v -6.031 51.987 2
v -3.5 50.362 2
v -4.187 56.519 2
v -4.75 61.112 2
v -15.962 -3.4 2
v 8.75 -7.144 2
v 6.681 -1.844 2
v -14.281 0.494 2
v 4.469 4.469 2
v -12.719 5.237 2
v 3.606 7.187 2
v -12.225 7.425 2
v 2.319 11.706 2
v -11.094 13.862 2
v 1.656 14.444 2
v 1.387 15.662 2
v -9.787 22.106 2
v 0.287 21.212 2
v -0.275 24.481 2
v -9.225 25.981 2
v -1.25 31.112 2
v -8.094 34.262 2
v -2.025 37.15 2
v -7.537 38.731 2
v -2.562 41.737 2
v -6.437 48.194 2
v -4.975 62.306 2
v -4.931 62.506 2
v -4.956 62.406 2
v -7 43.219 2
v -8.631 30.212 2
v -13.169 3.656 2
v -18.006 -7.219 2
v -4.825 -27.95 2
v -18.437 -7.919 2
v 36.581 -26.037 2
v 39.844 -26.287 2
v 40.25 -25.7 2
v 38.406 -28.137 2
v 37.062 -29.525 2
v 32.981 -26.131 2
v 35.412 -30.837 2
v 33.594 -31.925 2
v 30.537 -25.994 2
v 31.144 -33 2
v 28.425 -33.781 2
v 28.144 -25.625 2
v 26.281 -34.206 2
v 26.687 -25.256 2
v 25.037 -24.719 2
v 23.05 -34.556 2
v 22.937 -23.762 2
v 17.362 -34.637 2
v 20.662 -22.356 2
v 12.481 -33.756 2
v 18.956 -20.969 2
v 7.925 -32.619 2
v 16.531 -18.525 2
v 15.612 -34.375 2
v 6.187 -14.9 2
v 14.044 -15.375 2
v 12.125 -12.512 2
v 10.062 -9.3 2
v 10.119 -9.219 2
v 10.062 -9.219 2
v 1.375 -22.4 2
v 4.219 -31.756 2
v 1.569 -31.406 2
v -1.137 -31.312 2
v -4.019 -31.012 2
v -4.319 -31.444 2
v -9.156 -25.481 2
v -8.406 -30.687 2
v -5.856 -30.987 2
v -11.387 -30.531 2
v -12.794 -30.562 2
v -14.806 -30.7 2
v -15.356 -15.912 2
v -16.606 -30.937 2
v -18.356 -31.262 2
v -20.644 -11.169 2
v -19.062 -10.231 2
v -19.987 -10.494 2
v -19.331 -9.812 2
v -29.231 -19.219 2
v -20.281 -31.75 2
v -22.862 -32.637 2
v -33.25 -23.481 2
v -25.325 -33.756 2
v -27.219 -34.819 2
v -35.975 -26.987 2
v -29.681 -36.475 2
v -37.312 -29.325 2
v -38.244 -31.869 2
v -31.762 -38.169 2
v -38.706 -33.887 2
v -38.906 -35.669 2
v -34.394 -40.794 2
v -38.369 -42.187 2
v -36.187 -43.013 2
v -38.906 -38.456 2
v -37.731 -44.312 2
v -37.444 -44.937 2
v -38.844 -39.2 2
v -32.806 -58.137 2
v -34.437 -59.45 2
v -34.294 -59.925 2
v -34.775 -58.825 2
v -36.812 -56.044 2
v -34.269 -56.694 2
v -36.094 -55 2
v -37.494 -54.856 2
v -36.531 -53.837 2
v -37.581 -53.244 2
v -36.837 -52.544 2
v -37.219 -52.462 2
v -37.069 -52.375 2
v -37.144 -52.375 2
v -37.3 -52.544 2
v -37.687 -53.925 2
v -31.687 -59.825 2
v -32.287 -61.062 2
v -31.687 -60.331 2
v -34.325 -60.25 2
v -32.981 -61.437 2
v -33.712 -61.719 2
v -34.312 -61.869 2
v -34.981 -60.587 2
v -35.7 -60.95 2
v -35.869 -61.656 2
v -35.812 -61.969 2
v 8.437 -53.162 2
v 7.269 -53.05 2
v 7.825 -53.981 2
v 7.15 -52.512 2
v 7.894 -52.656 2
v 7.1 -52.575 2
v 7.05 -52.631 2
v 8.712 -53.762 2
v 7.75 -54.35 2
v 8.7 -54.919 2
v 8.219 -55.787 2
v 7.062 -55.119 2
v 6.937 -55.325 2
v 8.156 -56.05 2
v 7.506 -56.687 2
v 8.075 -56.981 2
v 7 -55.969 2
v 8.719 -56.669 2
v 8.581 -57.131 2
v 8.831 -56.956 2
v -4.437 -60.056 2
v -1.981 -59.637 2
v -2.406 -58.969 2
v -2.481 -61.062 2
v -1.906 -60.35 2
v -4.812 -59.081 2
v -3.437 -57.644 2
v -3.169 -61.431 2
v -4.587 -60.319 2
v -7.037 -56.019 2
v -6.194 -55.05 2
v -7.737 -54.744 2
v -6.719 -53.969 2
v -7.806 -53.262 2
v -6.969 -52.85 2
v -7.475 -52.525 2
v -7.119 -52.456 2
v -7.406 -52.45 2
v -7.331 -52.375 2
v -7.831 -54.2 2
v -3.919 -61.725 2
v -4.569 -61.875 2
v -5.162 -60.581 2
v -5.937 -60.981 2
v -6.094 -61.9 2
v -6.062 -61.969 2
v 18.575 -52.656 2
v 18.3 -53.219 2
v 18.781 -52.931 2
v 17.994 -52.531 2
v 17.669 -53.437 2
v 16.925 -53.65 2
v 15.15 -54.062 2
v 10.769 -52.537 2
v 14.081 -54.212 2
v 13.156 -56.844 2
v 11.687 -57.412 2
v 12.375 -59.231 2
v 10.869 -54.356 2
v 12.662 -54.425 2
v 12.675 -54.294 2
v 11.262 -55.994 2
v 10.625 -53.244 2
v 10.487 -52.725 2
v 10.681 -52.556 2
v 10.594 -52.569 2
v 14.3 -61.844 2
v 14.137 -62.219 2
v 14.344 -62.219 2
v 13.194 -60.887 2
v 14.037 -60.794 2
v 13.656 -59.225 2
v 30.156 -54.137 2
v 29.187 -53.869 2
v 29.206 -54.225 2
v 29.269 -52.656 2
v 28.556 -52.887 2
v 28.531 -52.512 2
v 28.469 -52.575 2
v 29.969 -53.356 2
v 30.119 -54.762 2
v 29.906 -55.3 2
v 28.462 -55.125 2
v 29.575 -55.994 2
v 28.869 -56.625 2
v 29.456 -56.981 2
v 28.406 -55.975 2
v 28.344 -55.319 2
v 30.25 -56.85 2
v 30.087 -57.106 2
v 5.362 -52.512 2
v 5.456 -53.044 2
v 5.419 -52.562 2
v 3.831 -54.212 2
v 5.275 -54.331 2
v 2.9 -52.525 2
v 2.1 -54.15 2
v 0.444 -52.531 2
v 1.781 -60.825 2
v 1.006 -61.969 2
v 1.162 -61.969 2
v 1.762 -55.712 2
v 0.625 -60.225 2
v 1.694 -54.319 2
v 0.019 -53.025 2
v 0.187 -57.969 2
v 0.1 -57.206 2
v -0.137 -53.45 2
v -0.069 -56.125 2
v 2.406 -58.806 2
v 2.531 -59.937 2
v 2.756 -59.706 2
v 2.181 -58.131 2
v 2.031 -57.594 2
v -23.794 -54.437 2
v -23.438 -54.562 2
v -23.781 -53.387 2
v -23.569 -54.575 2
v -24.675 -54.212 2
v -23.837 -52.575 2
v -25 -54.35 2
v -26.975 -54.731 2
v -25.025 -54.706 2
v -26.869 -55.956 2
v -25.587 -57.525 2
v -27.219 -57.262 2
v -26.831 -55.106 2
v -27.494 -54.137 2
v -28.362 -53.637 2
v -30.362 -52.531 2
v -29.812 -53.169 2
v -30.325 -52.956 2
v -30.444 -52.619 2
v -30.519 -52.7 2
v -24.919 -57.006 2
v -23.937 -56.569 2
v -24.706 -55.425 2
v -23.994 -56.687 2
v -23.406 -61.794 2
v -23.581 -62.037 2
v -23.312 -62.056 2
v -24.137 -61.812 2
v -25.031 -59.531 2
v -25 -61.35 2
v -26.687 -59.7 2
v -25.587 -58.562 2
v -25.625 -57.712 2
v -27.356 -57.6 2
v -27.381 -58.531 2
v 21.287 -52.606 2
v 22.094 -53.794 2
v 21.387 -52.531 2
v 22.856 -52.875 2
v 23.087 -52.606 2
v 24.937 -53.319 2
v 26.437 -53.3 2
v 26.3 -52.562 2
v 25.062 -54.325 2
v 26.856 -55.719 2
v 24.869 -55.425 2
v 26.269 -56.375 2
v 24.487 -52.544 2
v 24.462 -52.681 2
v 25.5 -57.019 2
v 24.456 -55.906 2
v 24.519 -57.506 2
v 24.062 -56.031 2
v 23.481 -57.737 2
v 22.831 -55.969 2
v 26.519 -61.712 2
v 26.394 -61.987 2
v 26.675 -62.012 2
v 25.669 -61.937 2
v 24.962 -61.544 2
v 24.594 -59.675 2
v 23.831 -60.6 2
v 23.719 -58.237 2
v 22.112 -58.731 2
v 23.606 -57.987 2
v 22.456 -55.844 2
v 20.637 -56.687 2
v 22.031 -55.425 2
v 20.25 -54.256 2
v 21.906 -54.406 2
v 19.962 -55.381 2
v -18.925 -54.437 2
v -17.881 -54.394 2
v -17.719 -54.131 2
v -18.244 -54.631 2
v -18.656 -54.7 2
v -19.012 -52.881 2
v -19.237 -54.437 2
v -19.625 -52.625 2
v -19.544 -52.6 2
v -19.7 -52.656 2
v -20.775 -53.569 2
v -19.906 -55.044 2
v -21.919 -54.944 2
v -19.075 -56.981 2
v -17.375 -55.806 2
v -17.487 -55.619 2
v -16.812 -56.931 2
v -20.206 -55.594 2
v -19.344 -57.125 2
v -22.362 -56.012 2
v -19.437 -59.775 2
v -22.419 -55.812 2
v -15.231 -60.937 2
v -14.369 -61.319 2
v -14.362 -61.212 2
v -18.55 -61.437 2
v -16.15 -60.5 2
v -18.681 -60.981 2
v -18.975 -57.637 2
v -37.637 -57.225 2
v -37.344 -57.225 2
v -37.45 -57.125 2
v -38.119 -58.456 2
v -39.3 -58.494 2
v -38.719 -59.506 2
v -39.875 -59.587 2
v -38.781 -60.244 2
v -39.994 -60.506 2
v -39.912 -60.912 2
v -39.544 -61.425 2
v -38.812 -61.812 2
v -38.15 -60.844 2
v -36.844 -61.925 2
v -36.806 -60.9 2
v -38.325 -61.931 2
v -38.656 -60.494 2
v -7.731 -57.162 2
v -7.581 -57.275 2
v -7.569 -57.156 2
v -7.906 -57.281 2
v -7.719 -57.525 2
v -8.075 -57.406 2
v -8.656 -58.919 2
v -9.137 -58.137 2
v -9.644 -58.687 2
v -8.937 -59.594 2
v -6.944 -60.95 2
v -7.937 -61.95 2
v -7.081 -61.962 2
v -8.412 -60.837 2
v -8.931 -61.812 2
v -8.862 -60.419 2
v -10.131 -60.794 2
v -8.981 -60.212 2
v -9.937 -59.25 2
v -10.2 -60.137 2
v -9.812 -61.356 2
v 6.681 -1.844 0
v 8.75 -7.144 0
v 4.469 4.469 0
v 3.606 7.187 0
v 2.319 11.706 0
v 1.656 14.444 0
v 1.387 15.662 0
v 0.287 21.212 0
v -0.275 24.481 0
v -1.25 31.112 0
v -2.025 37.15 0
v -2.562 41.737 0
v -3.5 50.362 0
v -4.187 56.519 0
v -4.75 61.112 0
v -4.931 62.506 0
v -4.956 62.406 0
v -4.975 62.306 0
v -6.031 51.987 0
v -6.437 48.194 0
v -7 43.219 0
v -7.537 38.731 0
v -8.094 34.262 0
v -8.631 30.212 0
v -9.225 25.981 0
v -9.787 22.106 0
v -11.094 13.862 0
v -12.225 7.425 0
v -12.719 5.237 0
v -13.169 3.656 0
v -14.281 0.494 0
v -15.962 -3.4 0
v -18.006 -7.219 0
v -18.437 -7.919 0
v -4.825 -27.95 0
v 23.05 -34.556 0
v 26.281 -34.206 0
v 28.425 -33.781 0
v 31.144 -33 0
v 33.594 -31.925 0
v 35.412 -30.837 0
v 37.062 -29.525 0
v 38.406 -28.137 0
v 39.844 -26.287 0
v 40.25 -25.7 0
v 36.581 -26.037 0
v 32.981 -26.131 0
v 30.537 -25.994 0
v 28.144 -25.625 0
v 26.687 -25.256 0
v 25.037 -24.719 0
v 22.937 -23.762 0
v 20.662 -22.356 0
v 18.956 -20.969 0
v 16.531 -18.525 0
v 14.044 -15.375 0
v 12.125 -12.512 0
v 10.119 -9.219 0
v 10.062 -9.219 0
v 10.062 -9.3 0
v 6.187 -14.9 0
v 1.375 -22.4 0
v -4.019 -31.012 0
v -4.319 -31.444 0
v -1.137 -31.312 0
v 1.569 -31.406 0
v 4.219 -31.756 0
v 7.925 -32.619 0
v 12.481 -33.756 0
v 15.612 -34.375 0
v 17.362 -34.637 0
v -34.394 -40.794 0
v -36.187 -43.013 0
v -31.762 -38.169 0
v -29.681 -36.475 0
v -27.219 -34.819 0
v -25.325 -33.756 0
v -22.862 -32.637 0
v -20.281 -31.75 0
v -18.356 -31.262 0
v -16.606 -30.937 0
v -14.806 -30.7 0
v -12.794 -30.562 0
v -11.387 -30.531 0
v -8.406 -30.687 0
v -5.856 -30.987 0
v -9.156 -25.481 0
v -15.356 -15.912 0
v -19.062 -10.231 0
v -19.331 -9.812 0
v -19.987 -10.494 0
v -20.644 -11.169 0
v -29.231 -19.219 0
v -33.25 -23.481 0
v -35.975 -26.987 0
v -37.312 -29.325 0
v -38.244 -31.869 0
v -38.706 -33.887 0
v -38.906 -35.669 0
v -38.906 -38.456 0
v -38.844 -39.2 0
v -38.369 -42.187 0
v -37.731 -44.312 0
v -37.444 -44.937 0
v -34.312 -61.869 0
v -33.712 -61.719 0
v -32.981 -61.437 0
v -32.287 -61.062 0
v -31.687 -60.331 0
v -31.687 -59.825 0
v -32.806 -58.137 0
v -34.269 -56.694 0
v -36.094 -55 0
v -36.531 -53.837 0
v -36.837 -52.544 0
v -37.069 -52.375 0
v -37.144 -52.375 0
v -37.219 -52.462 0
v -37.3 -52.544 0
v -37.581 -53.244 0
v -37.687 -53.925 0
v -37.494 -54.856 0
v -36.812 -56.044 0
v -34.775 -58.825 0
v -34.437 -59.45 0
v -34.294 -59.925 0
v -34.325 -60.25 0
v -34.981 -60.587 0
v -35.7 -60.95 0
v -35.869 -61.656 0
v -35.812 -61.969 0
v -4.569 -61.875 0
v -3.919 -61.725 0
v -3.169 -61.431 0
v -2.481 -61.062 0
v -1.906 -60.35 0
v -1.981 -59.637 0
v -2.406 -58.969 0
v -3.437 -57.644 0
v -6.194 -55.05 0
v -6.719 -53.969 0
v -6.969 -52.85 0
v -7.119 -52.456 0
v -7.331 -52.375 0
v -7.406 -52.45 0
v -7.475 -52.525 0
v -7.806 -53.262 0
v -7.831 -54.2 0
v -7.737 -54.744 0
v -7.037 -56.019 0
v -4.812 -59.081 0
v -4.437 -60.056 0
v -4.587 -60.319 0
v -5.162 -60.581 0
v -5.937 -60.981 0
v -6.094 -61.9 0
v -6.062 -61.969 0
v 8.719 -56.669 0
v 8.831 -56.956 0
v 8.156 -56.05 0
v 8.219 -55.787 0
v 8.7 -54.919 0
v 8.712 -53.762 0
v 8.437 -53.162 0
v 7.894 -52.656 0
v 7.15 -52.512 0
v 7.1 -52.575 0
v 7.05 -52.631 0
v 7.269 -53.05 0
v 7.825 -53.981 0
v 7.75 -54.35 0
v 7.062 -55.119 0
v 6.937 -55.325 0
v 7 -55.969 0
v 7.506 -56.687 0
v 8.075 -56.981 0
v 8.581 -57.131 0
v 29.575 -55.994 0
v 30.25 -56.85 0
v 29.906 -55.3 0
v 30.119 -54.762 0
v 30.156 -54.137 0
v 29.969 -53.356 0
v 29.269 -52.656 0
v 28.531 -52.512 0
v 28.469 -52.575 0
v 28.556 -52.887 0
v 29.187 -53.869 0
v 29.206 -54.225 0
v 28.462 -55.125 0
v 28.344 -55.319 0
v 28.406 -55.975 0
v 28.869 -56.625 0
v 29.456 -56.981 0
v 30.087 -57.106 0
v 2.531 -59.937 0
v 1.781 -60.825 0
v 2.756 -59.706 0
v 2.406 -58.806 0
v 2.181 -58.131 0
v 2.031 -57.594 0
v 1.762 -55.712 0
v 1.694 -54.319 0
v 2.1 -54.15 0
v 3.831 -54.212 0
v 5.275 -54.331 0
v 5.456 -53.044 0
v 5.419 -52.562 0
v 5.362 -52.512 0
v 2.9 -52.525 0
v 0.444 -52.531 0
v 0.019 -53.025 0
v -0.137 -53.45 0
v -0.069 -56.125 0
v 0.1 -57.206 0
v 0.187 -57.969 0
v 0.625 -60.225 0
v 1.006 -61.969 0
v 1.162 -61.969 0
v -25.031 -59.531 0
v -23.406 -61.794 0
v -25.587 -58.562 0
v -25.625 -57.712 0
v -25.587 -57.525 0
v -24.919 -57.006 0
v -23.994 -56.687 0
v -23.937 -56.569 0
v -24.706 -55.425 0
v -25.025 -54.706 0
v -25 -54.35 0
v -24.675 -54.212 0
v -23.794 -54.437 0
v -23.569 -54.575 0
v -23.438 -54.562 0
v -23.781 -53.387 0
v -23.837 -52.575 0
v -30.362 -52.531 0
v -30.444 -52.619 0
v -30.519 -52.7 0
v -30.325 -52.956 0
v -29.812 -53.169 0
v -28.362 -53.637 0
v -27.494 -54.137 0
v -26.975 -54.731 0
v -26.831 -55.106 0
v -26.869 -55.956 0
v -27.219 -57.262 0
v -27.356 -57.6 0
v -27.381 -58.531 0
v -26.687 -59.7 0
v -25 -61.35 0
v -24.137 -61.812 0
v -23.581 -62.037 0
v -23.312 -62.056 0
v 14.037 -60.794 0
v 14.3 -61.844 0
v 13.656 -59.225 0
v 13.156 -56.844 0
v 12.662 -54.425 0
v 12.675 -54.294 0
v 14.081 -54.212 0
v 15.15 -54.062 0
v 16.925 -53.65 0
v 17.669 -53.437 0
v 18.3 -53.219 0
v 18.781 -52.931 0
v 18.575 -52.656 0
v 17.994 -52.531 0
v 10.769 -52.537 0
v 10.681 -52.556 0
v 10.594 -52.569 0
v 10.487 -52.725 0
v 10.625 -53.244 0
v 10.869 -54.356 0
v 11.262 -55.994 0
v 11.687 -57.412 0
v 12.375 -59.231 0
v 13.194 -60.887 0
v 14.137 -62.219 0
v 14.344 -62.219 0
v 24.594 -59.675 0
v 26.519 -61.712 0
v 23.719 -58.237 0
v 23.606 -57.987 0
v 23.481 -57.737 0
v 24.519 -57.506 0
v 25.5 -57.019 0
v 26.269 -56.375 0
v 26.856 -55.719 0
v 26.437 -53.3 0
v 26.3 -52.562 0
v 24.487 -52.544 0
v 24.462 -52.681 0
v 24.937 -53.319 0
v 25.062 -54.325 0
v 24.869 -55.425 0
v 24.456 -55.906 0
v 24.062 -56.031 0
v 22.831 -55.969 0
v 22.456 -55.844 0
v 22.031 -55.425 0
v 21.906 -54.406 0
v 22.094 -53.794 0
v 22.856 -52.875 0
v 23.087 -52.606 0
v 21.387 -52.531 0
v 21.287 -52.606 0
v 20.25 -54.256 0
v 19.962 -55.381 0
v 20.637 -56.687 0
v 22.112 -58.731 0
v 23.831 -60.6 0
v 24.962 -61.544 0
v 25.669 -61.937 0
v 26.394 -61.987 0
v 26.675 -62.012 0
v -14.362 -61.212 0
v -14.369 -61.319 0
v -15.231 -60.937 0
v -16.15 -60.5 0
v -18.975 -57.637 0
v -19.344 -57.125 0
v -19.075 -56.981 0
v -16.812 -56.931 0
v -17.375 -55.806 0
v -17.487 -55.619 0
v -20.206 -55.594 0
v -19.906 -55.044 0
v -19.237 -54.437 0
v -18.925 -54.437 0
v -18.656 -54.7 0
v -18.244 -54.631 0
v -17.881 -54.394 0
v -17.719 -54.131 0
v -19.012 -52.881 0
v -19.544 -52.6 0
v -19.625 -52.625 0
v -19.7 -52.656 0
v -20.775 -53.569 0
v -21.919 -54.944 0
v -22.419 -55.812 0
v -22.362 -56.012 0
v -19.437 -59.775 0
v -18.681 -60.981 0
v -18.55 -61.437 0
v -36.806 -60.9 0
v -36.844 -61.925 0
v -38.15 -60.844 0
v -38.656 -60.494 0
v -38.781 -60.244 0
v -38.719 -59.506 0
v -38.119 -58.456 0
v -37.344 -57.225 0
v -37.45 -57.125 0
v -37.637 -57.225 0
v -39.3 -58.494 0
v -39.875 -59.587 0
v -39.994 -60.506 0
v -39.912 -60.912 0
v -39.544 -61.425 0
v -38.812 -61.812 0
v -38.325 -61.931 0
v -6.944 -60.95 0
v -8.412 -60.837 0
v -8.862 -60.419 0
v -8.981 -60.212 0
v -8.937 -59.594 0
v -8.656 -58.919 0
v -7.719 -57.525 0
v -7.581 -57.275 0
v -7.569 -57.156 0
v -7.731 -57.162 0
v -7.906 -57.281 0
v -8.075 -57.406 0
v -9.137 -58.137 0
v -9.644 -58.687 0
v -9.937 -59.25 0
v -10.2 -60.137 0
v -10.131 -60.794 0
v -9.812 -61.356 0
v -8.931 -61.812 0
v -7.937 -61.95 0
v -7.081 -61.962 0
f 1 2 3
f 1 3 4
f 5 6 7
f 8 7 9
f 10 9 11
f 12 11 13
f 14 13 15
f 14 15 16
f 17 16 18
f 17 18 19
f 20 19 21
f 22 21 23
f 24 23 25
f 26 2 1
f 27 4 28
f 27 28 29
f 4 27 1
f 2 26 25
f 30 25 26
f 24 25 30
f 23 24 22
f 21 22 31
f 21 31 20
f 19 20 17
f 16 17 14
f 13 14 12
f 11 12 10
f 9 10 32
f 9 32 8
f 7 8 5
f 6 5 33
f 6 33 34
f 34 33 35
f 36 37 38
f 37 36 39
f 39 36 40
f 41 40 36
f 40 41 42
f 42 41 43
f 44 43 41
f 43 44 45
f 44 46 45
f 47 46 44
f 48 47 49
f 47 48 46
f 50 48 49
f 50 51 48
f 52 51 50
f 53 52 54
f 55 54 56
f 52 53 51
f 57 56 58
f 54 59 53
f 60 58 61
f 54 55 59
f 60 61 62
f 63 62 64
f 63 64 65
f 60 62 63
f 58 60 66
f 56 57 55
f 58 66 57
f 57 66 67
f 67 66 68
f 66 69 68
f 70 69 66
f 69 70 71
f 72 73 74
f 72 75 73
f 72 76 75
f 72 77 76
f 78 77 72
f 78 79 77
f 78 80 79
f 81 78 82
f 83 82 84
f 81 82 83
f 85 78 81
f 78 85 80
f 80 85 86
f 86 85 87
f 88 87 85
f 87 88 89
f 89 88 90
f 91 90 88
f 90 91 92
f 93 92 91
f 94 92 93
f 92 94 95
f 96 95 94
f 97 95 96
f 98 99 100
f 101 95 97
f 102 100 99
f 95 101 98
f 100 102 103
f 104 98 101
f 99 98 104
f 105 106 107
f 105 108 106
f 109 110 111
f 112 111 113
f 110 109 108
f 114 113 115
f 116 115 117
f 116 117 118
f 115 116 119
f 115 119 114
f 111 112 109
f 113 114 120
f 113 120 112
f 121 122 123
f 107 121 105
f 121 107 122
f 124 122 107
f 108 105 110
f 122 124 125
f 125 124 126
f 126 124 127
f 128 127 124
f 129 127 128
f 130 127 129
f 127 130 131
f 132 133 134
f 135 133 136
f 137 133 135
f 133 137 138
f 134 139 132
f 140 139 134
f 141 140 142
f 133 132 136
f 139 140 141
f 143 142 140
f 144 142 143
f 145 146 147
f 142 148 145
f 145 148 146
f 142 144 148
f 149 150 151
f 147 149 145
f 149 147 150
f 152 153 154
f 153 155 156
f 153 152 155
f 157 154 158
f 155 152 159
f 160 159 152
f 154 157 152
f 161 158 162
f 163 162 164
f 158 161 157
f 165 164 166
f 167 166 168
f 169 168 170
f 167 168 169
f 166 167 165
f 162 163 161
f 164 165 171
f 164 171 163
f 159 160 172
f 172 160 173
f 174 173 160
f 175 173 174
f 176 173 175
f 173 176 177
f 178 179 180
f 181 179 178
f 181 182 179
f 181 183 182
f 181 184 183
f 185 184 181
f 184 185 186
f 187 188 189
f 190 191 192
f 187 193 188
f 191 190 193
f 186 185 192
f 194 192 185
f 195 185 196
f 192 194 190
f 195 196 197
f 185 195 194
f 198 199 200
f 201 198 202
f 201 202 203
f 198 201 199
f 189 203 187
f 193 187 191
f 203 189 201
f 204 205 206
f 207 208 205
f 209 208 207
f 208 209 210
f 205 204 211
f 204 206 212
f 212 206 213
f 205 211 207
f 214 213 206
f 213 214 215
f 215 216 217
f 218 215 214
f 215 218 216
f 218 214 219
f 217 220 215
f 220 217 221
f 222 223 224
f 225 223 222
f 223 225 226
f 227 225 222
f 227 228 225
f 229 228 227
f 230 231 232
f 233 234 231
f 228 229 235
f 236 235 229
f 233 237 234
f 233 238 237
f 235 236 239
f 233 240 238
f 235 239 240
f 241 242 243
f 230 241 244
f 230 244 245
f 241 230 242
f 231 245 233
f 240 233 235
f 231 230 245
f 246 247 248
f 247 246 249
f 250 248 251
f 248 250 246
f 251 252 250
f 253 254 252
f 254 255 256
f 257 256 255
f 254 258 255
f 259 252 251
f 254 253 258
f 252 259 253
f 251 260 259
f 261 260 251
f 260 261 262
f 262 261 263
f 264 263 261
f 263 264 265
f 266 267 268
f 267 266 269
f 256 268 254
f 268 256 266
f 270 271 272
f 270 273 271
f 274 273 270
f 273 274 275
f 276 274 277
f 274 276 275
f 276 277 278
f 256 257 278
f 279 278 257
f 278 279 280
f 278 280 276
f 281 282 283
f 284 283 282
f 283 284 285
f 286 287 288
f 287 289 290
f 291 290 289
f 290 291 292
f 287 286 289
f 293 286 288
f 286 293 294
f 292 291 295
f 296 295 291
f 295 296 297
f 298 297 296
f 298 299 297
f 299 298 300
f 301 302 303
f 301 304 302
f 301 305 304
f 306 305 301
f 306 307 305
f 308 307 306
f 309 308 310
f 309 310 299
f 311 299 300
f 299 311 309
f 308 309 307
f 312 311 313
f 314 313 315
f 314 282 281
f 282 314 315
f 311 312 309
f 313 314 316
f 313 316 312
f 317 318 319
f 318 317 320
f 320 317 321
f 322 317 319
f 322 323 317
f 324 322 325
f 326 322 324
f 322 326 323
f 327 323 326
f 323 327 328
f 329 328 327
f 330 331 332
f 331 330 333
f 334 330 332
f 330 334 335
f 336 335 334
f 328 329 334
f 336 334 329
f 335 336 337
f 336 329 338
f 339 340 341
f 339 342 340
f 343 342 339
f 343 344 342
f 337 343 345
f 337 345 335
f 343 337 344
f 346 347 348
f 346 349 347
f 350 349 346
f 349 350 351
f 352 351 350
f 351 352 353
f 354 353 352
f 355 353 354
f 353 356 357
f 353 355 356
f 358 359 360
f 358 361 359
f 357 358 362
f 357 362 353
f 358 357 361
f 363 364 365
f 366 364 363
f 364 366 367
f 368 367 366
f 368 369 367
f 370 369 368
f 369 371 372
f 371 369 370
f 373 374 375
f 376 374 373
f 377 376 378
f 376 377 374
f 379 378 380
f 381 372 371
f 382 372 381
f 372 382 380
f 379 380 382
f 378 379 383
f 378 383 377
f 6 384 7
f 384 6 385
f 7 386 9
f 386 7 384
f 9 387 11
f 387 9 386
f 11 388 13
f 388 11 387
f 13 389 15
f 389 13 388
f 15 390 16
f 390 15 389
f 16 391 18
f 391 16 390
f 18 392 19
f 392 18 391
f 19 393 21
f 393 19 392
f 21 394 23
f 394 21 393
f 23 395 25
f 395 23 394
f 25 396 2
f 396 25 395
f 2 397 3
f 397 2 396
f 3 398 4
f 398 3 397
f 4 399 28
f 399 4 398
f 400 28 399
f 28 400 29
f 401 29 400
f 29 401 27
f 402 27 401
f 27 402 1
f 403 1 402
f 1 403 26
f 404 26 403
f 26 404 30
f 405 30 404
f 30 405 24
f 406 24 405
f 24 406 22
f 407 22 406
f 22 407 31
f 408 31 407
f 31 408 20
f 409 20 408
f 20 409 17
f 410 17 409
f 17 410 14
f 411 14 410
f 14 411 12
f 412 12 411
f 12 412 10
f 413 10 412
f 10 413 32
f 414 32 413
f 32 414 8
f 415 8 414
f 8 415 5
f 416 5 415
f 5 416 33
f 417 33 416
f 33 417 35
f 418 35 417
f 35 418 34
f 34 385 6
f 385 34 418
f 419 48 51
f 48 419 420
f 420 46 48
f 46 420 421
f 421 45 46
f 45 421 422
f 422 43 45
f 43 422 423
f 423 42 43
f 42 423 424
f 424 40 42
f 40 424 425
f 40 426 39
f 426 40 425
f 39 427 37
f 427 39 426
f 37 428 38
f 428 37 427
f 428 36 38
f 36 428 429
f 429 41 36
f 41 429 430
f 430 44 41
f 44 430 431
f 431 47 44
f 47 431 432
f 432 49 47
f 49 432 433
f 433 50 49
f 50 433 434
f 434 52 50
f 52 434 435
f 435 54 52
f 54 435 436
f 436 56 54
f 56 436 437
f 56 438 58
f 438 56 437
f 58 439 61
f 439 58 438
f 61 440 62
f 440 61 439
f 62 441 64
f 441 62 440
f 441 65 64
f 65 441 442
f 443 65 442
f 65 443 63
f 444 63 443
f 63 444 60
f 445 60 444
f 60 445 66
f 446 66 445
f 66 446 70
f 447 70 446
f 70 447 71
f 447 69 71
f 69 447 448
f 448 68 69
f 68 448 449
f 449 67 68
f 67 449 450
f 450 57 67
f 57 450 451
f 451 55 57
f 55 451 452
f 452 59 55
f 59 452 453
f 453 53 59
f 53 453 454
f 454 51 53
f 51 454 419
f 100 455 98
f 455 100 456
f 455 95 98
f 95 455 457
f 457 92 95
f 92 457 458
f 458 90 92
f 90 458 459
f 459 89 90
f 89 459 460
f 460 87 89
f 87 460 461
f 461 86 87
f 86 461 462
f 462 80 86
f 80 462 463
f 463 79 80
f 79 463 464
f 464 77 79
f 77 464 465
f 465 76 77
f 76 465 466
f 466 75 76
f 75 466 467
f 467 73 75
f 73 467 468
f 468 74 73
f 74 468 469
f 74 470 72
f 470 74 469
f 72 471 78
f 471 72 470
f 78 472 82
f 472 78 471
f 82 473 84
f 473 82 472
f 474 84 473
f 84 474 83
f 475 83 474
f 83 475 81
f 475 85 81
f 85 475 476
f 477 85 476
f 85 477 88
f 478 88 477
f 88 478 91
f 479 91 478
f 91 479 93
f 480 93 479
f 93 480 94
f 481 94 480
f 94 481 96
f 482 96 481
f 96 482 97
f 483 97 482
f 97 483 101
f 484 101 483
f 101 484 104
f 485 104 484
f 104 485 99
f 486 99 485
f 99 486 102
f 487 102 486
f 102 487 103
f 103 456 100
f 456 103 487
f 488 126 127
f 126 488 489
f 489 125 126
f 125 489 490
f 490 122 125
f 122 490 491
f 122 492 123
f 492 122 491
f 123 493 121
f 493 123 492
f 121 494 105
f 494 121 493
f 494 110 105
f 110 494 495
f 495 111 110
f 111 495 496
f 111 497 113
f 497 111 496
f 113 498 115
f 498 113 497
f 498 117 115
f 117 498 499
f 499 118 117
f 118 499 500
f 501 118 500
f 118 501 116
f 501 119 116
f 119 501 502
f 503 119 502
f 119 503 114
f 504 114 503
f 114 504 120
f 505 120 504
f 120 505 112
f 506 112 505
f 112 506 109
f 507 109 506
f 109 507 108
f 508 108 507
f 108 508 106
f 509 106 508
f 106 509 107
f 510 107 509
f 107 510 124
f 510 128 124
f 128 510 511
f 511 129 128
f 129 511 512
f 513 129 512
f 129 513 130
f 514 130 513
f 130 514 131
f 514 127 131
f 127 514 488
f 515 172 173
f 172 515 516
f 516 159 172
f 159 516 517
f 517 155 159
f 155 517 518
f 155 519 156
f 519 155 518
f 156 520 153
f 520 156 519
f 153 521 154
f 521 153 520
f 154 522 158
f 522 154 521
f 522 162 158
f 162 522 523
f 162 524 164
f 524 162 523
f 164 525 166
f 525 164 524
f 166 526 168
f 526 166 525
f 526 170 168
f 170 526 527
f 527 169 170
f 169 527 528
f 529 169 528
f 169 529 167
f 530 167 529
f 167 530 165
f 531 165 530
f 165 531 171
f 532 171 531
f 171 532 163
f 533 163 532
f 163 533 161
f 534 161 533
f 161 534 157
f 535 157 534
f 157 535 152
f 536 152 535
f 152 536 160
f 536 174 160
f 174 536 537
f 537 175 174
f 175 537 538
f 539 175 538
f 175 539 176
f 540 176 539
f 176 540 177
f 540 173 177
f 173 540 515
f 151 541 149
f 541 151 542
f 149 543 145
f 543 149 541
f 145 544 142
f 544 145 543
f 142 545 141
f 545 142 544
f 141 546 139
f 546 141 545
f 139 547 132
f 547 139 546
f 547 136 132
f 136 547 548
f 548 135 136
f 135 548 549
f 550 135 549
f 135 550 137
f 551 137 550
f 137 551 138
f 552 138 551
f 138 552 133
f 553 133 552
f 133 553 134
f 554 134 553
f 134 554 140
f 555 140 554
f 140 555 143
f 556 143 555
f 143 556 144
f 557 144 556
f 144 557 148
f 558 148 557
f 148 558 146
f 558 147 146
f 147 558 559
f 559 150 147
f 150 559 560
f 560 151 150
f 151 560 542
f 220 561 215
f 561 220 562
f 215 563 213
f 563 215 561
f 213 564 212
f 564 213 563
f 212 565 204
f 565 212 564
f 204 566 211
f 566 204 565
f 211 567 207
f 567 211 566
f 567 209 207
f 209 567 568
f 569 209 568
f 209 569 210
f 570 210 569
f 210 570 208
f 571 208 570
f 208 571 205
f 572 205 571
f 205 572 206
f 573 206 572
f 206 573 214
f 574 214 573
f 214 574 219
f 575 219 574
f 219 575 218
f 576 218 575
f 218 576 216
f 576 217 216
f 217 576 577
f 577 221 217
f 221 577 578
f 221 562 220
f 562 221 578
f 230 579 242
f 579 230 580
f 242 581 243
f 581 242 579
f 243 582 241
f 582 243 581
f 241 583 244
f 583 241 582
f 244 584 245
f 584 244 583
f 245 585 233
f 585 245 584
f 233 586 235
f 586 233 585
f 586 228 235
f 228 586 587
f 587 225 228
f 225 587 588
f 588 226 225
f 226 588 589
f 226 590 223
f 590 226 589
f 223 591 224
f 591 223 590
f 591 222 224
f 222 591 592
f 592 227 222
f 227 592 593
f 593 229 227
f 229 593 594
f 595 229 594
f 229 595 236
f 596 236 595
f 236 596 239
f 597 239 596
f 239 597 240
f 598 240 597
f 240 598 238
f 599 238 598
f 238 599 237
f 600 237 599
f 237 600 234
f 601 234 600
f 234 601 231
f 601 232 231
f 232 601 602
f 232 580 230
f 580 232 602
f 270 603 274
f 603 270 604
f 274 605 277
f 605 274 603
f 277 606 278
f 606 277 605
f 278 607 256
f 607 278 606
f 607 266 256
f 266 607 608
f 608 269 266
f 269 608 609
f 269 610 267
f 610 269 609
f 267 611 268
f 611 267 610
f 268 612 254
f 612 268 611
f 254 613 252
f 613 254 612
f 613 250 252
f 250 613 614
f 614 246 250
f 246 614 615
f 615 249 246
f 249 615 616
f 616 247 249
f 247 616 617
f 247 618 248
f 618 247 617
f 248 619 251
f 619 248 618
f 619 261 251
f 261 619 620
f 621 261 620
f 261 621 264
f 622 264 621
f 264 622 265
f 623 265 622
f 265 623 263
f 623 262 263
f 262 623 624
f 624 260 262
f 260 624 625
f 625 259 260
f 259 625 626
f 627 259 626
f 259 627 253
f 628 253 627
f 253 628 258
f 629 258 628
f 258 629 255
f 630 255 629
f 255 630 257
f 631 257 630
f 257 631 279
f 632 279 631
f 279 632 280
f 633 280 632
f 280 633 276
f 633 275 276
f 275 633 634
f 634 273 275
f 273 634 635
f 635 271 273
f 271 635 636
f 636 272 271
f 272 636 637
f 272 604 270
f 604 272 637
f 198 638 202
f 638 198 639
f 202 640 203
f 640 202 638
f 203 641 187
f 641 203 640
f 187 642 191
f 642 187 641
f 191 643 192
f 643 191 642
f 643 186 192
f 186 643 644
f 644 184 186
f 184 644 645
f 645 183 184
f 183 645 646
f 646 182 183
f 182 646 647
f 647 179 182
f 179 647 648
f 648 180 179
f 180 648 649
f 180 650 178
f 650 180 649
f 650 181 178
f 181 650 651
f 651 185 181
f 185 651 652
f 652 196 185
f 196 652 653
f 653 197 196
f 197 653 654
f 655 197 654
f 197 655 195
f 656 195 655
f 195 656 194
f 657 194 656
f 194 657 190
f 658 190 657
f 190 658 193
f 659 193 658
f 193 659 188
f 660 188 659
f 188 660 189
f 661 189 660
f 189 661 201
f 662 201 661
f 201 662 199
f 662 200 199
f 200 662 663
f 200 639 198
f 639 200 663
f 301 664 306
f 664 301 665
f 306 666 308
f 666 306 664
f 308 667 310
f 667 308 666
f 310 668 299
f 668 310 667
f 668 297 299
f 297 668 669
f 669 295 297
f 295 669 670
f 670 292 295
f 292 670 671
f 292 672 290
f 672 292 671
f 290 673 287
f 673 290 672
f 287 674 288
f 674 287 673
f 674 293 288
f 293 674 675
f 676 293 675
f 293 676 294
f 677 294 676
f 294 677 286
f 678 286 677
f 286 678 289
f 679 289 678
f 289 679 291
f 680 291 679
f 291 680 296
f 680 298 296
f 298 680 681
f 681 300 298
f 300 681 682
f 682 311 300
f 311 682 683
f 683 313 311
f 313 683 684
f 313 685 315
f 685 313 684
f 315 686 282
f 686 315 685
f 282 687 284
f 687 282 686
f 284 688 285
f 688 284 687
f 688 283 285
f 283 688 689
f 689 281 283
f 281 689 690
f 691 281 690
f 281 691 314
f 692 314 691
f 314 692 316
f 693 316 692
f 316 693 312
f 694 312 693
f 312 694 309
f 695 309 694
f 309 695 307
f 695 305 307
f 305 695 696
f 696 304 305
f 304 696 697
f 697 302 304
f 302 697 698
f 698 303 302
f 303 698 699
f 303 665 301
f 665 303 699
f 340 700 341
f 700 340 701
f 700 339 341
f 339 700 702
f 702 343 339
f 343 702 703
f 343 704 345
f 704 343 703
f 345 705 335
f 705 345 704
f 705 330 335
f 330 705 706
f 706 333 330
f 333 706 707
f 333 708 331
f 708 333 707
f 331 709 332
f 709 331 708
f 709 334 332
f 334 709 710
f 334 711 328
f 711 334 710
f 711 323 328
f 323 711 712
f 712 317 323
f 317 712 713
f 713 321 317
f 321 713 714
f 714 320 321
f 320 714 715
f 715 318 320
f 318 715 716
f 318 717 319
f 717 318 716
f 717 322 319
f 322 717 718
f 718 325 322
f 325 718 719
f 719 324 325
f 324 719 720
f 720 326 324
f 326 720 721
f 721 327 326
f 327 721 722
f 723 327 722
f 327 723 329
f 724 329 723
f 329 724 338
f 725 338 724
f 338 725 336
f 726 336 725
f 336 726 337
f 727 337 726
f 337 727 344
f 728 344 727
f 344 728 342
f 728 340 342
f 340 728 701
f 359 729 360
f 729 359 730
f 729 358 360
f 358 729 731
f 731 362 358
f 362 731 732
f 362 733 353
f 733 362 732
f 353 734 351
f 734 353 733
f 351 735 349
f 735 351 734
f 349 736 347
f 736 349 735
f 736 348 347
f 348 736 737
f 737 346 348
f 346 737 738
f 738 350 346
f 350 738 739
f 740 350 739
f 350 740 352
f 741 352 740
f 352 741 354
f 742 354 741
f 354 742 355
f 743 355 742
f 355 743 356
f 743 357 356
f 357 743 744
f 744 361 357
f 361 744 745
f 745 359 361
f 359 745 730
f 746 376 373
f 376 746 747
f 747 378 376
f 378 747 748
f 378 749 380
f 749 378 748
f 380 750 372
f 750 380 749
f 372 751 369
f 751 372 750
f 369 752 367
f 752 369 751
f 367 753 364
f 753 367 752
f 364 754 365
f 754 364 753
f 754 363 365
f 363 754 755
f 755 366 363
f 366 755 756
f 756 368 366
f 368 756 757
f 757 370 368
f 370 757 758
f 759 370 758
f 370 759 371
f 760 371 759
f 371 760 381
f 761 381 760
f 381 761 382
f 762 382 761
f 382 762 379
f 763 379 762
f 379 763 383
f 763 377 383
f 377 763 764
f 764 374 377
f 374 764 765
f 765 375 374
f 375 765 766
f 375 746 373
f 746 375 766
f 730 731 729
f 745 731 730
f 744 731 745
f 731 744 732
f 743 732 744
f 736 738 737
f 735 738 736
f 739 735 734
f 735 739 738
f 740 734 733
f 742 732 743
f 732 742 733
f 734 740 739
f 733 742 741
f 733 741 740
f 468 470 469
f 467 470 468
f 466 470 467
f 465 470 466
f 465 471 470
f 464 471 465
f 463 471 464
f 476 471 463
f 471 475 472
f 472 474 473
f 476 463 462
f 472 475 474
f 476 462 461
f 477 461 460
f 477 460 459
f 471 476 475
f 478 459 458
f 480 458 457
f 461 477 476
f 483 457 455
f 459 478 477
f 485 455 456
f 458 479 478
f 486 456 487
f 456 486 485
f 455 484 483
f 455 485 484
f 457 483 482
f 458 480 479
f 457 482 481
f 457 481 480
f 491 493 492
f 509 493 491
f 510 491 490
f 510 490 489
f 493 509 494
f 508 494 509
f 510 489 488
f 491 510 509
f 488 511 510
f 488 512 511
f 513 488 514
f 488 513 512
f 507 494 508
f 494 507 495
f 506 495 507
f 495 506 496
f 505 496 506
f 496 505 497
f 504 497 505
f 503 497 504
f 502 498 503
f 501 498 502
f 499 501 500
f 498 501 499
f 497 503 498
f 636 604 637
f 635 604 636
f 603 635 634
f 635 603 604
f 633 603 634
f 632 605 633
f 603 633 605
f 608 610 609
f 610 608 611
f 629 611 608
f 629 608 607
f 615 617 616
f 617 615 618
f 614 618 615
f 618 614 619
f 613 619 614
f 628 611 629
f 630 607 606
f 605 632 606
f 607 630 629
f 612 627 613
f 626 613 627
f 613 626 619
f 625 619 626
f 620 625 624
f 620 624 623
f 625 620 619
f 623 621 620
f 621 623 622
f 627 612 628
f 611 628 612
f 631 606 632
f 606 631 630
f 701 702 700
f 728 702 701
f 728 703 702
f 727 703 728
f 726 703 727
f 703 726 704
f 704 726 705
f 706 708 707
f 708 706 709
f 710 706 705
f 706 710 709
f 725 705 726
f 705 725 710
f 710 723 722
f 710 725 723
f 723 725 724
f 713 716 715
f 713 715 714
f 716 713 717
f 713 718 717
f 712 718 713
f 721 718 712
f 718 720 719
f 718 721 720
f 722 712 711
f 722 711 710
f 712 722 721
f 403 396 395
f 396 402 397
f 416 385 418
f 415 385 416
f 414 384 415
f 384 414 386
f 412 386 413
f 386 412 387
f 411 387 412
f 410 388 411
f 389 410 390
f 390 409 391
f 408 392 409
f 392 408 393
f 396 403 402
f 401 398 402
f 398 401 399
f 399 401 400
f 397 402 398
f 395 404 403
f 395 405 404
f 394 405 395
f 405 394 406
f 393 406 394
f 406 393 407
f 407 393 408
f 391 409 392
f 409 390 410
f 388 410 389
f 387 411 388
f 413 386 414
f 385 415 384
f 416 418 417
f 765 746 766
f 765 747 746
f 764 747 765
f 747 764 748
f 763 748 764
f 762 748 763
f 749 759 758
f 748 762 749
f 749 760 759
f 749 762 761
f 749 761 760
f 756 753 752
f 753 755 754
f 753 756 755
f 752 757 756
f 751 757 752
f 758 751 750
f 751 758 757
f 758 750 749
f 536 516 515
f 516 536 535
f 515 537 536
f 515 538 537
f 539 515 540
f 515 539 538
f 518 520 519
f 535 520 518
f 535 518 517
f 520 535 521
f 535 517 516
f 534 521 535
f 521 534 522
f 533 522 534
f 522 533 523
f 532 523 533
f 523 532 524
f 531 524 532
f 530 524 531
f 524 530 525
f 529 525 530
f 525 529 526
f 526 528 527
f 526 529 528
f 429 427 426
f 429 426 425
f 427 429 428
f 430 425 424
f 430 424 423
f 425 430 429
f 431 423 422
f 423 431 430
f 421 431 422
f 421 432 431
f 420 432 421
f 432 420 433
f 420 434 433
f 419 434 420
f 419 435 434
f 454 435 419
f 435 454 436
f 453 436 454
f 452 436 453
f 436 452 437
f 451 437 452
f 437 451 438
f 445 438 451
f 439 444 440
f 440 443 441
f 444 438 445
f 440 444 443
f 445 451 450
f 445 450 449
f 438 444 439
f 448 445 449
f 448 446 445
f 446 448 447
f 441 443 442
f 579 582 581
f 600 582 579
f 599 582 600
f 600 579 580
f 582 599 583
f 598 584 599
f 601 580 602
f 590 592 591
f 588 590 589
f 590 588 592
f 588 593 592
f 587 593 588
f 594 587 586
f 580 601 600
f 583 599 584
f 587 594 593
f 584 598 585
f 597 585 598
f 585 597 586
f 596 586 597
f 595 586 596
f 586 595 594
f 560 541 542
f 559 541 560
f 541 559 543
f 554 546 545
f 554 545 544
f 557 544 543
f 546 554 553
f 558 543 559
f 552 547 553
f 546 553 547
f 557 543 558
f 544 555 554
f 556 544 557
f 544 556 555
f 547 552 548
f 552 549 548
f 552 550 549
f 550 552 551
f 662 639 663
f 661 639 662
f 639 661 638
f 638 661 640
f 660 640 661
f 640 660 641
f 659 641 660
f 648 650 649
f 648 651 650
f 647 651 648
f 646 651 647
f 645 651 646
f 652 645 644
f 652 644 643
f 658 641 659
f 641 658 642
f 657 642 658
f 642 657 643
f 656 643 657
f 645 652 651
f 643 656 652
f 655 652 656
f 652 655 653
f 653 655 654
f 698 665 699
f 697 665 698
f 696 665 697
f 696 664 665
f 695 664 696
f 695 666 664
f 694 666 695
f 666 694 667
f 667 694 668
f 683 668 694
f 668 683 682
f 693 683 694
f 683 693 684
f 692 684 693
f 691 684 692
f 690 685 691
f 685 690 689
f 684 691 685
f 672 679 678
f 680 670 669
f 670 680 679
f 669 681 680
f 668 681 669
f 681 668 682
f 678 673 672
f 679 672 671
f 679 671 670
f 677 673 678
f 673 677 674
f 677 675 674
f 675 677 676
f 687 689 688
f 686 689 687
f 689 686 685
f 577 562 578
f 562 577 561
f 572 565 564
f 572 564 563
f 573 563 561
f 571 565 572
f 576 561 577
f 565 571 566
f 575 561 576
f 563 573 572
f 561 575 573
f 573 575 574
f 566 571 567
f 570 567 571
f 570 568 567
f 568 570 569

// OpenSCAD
module 8fae42abe3a7e06b2b3063bd8651e884_1()
{
 /* Generated by trace2scad version 20150415
    http://aggregate.org/MAKE/TRACE2SCAD/
    Optimized model has 387/4796 original points
 */
 color([0.48, 0.48, 0.48])
 assign(minx=0) /* polygon minx=39 */
 assign(miny=0) /* polygon miny=45 */
 assign(maxx=12880) /* polygon maxx=12880 */
 assign(maxy=20000) /* polygon maxy=20001 */
 assign(dx=maxx-minx)
 assign(dy=maxy-miny)
 assign(maxd=((dx>dy)?dx:dy))
 scale([1/maxd, 1/maxd, 1])
 translate([-minx-dx/2, -miny-dy/2, 0])
 linear_extrude(height=1, convexity=387)
 union() {
  union() {
   polygon([[5647,19985],[5644,19969],[5475,18318],[5410,17711],[5320,16915],[5234,16197],[5145,15482],[5059,14834],[4964,14157],[4874,13537],[4665,12218],[4484,11188],[4405,10838],[4333,10585],[4155,10079],[3886,9456],[3559,8845],[3490,8733],[5668,5528],[7840,8857],[7509,9705],[7155,10715],[7017,11150],[6811,11873],[6705,12311],[6662,12506],[6486,13394],[6396,13917],[6240,14978],[6116,15944],[6030,16678],[5880,18058],[5770,19043],[5680,19778],[5651,20001]], convexity=6);
   polygon([[8050,8518],[8050,8512],[7430,7616],[6660,6416],[5797,5038],[5749,4969],[6258,4990],[6691,4975],[7115,4919],[7708,4781],[8437,4599],[8938,4500],[9218,4458],[10128,4471],[10645,4527],[10988,4595],[11423,4720],[11815,4892],[12106,5066],[12370,5276],[12585,5498],[12815,5794],[12880,5888],[12293,5834],[11717,5819],[11326,5841],[10943,5900],[10710,5959],[10446,6045],[10110,6198],[9746,6423],[9473,6645],[9085,7036],[8687,7540],[8380,7998],[8059,8525],[8050,8525]], convexity=9);
   polygon([[3242,8321],[3137,8213],[1763,6925],[1120,6243],[684,5682],[470,5308],[321,4901],[247,4578],[215,4293],[215,3847],[225,3728],[301,3250],[403,2910],[449,2810],[650,3118],[937,3473],[1358,3893],[1691,4164],[2085,4429],[2388,4599],[2782,4778],[3195,4920],[3503,4998],[3783,5050],[4071,5088],[4393,5110],[4618,5115],[5095,5090],[5503,5042],[4975,5923],[3983,7454],[3390,8363],[3347,8430]], convexity=7);
   polygon([[485,1606],[472,1593],[427,1481],[410,1372],[441,1223],[550,1033],[876,588],[930,488],[953,412],[948,360],[843,306],[728,248],[701,135],[710,85],[950,101],[1046,125],[1163,170],[1274,230],[1370,347],[1370,428],[1191,698],[957,929],[665,1200],[595,1386],[546,1593],[509,1620],[497,1620]], convexity=8);
   polygon([[5255,1608],[5244,1596],[5191,1478],[5187,1328],[5202,1241],[5314,1037],[5670,547],[5730,391],[5706,349],[5614,307],[5490,243],[5465,96],[5470,85],[5709,100],[5813,124],[5933,171],[6043,230],[6135,344],[6123,458],[6055,565],[5890,777],[5449,1192],[5365,1365],[5325,1544],[5301,1607],[5267,1620]], convexity=8);
   polygon([[6904,1596],[6511,1595],[6443,1516],[6418,1448],[6429,1020],[6456,847],[6470,725],[6540,364],[6601,85],[6626,85],[6725,268],[6845,410],[6881,447],[6825,591],[6789,699],[6765,785],[6722,1086],[6711,1309],[6776,1336],[7053,1326],[7284,1307],[7313,1513],[7307,1590],[7298,1598]], convexity=10);
   polygon([[7576,1588],[7568,1579],[7603,1512],[7692,1363],[7680,1304],[7570,1181],[7550,1148],[7560,1045],[7641,930],[7732,883],[7813,859],[7853,887],[7835,933],[7745,1032],[7755,1074],[7832,1213],[7834,1398],[7790,1494],[7703,1575],[7584,1598]], convexity=10);
   polygon([[11000,1593],[10995,1588],[11009,1538],[11110,1381],[11113,1324],[10994,1180],[10975,1149],[10985,1044],[11059,940],[11153,883],[11254,863],[11280,904],[11172,1041],[11225,1152],[11259,1238],[11265,1338],[11235,1463],[11123,1575],[11005,1598]], convexity=10);
   polygon([[1569,1581],[1557,1568],[1588,1527],[1670,1493],[1902,1418],[2041,1338],[2124,1243],[2147,1183],[2141,1047],[2085,838],[2063,784],[2059,635],[2170,448],[2440,184],[2578,110],[2667,74],[2710,71],[2695,113],[2435,475],[2346,630],[2340,766],[2346,796],[2453,879],[2601,930],[2610,949],[2487,1132],[2436,1247],[2440,1304],[2492,1326],[2633,1290],[2669,1268],[2690,1270],[2635,1458],[2626,1588],[1582,1595]], convexity=13);
   polygon([[8149,1591],[8135,1589],[8118,1564],[8140,1481],[8179,1303],[8242,1041],[8310,814],[8420,523],[8551,258],[8702,45],[8735,45],[8728,105],[8686,273],[8625,524],[8545,905],[8466,1292],[8468,1313],[8693,1326],[8864,1350],[9148,1416],[9267,1450],[9368,1485],[9445,1531],[9412,1575],[9319,1595],[8163,1594]], convexity=9);
   polygon([[9854,1589],[9846,1583],[9680,1319],[9634,1139],[9742,930],[9978,603],[10253,304],[10434,153],[10547,90],[10663,82],[10708,78],[10683,126],[10375,452],[10235,682],[10217,722],[10197,762],[10363,799],[10520,877],[10643,980],[10737,1085],[10670,1472],[10648,1590],[10358,1593],[10354,1571],[10430,1469],[10450,1308],[10419,1132],[10353,1055],[10290,1035],[10093,1045],[10033,1065],[9965,1132],[9945,1295],[9975,1393],[10097,1540],[10134,1583],[9862,1595]], convexity=13);
   polygon([[3300,1580],[3288,1575],[3116,1429],[2933,1209],[2853,1070],[2862,1038],[3330,436],[3451,243],[3472,170],[4141,189],[4142,206],[4003,250],[3856,320],[3404,778],[3345,860],[3388,883],[3750,891],[3660,1071],[3642,1101],[3207,1105],[3255,1193],[3362,1290],[3412,1290],[3455,1248],[3521,1259],[3579,1297],[3605,1339],[3398,1539],[3313,1584]], convexity=12);
   polygon([[433,852],[418,844],[152,641],[60,466],[41,319],[54,254],[113,172],[230,110],[308,91],[545,92],[551,256],[336,265],[255,321],[235,361],[245,479],[341,647],[465,844],[448,860]], convexity=8);
   polygon([[5175,835],[5148,815],[4978,698],[4897,610],[4850,520],[4808,378],[4819,273],[4870,183],[5011,110],[5170,88],[5307,86],[5329,248],[5094,266],[5022,333],[5003,366],[5010,465],[5055,573],[5205,796],[5227,836],[5229,855],[5203,854]], convexity=8);
  }
 }
}

module 8fae42abe3a7e06b2b3063bd8651e884()
{
 /* all layers combined, scaled to within a 1mm cube */
 scale([1, 1, 1/1])
 difference() {
  union() {
   scale([1,1,2]) translate([0,0,-0.5]) 8fae42abe3a7e06b2b3063bd8651e884_1();
  }
  translate([0,0,-2]) cube([2,2,4],center=true);
 }
}

scale([125, 125, 2]) {
	8fae42abe3a7e06b2b3063bd8651e884();
}
